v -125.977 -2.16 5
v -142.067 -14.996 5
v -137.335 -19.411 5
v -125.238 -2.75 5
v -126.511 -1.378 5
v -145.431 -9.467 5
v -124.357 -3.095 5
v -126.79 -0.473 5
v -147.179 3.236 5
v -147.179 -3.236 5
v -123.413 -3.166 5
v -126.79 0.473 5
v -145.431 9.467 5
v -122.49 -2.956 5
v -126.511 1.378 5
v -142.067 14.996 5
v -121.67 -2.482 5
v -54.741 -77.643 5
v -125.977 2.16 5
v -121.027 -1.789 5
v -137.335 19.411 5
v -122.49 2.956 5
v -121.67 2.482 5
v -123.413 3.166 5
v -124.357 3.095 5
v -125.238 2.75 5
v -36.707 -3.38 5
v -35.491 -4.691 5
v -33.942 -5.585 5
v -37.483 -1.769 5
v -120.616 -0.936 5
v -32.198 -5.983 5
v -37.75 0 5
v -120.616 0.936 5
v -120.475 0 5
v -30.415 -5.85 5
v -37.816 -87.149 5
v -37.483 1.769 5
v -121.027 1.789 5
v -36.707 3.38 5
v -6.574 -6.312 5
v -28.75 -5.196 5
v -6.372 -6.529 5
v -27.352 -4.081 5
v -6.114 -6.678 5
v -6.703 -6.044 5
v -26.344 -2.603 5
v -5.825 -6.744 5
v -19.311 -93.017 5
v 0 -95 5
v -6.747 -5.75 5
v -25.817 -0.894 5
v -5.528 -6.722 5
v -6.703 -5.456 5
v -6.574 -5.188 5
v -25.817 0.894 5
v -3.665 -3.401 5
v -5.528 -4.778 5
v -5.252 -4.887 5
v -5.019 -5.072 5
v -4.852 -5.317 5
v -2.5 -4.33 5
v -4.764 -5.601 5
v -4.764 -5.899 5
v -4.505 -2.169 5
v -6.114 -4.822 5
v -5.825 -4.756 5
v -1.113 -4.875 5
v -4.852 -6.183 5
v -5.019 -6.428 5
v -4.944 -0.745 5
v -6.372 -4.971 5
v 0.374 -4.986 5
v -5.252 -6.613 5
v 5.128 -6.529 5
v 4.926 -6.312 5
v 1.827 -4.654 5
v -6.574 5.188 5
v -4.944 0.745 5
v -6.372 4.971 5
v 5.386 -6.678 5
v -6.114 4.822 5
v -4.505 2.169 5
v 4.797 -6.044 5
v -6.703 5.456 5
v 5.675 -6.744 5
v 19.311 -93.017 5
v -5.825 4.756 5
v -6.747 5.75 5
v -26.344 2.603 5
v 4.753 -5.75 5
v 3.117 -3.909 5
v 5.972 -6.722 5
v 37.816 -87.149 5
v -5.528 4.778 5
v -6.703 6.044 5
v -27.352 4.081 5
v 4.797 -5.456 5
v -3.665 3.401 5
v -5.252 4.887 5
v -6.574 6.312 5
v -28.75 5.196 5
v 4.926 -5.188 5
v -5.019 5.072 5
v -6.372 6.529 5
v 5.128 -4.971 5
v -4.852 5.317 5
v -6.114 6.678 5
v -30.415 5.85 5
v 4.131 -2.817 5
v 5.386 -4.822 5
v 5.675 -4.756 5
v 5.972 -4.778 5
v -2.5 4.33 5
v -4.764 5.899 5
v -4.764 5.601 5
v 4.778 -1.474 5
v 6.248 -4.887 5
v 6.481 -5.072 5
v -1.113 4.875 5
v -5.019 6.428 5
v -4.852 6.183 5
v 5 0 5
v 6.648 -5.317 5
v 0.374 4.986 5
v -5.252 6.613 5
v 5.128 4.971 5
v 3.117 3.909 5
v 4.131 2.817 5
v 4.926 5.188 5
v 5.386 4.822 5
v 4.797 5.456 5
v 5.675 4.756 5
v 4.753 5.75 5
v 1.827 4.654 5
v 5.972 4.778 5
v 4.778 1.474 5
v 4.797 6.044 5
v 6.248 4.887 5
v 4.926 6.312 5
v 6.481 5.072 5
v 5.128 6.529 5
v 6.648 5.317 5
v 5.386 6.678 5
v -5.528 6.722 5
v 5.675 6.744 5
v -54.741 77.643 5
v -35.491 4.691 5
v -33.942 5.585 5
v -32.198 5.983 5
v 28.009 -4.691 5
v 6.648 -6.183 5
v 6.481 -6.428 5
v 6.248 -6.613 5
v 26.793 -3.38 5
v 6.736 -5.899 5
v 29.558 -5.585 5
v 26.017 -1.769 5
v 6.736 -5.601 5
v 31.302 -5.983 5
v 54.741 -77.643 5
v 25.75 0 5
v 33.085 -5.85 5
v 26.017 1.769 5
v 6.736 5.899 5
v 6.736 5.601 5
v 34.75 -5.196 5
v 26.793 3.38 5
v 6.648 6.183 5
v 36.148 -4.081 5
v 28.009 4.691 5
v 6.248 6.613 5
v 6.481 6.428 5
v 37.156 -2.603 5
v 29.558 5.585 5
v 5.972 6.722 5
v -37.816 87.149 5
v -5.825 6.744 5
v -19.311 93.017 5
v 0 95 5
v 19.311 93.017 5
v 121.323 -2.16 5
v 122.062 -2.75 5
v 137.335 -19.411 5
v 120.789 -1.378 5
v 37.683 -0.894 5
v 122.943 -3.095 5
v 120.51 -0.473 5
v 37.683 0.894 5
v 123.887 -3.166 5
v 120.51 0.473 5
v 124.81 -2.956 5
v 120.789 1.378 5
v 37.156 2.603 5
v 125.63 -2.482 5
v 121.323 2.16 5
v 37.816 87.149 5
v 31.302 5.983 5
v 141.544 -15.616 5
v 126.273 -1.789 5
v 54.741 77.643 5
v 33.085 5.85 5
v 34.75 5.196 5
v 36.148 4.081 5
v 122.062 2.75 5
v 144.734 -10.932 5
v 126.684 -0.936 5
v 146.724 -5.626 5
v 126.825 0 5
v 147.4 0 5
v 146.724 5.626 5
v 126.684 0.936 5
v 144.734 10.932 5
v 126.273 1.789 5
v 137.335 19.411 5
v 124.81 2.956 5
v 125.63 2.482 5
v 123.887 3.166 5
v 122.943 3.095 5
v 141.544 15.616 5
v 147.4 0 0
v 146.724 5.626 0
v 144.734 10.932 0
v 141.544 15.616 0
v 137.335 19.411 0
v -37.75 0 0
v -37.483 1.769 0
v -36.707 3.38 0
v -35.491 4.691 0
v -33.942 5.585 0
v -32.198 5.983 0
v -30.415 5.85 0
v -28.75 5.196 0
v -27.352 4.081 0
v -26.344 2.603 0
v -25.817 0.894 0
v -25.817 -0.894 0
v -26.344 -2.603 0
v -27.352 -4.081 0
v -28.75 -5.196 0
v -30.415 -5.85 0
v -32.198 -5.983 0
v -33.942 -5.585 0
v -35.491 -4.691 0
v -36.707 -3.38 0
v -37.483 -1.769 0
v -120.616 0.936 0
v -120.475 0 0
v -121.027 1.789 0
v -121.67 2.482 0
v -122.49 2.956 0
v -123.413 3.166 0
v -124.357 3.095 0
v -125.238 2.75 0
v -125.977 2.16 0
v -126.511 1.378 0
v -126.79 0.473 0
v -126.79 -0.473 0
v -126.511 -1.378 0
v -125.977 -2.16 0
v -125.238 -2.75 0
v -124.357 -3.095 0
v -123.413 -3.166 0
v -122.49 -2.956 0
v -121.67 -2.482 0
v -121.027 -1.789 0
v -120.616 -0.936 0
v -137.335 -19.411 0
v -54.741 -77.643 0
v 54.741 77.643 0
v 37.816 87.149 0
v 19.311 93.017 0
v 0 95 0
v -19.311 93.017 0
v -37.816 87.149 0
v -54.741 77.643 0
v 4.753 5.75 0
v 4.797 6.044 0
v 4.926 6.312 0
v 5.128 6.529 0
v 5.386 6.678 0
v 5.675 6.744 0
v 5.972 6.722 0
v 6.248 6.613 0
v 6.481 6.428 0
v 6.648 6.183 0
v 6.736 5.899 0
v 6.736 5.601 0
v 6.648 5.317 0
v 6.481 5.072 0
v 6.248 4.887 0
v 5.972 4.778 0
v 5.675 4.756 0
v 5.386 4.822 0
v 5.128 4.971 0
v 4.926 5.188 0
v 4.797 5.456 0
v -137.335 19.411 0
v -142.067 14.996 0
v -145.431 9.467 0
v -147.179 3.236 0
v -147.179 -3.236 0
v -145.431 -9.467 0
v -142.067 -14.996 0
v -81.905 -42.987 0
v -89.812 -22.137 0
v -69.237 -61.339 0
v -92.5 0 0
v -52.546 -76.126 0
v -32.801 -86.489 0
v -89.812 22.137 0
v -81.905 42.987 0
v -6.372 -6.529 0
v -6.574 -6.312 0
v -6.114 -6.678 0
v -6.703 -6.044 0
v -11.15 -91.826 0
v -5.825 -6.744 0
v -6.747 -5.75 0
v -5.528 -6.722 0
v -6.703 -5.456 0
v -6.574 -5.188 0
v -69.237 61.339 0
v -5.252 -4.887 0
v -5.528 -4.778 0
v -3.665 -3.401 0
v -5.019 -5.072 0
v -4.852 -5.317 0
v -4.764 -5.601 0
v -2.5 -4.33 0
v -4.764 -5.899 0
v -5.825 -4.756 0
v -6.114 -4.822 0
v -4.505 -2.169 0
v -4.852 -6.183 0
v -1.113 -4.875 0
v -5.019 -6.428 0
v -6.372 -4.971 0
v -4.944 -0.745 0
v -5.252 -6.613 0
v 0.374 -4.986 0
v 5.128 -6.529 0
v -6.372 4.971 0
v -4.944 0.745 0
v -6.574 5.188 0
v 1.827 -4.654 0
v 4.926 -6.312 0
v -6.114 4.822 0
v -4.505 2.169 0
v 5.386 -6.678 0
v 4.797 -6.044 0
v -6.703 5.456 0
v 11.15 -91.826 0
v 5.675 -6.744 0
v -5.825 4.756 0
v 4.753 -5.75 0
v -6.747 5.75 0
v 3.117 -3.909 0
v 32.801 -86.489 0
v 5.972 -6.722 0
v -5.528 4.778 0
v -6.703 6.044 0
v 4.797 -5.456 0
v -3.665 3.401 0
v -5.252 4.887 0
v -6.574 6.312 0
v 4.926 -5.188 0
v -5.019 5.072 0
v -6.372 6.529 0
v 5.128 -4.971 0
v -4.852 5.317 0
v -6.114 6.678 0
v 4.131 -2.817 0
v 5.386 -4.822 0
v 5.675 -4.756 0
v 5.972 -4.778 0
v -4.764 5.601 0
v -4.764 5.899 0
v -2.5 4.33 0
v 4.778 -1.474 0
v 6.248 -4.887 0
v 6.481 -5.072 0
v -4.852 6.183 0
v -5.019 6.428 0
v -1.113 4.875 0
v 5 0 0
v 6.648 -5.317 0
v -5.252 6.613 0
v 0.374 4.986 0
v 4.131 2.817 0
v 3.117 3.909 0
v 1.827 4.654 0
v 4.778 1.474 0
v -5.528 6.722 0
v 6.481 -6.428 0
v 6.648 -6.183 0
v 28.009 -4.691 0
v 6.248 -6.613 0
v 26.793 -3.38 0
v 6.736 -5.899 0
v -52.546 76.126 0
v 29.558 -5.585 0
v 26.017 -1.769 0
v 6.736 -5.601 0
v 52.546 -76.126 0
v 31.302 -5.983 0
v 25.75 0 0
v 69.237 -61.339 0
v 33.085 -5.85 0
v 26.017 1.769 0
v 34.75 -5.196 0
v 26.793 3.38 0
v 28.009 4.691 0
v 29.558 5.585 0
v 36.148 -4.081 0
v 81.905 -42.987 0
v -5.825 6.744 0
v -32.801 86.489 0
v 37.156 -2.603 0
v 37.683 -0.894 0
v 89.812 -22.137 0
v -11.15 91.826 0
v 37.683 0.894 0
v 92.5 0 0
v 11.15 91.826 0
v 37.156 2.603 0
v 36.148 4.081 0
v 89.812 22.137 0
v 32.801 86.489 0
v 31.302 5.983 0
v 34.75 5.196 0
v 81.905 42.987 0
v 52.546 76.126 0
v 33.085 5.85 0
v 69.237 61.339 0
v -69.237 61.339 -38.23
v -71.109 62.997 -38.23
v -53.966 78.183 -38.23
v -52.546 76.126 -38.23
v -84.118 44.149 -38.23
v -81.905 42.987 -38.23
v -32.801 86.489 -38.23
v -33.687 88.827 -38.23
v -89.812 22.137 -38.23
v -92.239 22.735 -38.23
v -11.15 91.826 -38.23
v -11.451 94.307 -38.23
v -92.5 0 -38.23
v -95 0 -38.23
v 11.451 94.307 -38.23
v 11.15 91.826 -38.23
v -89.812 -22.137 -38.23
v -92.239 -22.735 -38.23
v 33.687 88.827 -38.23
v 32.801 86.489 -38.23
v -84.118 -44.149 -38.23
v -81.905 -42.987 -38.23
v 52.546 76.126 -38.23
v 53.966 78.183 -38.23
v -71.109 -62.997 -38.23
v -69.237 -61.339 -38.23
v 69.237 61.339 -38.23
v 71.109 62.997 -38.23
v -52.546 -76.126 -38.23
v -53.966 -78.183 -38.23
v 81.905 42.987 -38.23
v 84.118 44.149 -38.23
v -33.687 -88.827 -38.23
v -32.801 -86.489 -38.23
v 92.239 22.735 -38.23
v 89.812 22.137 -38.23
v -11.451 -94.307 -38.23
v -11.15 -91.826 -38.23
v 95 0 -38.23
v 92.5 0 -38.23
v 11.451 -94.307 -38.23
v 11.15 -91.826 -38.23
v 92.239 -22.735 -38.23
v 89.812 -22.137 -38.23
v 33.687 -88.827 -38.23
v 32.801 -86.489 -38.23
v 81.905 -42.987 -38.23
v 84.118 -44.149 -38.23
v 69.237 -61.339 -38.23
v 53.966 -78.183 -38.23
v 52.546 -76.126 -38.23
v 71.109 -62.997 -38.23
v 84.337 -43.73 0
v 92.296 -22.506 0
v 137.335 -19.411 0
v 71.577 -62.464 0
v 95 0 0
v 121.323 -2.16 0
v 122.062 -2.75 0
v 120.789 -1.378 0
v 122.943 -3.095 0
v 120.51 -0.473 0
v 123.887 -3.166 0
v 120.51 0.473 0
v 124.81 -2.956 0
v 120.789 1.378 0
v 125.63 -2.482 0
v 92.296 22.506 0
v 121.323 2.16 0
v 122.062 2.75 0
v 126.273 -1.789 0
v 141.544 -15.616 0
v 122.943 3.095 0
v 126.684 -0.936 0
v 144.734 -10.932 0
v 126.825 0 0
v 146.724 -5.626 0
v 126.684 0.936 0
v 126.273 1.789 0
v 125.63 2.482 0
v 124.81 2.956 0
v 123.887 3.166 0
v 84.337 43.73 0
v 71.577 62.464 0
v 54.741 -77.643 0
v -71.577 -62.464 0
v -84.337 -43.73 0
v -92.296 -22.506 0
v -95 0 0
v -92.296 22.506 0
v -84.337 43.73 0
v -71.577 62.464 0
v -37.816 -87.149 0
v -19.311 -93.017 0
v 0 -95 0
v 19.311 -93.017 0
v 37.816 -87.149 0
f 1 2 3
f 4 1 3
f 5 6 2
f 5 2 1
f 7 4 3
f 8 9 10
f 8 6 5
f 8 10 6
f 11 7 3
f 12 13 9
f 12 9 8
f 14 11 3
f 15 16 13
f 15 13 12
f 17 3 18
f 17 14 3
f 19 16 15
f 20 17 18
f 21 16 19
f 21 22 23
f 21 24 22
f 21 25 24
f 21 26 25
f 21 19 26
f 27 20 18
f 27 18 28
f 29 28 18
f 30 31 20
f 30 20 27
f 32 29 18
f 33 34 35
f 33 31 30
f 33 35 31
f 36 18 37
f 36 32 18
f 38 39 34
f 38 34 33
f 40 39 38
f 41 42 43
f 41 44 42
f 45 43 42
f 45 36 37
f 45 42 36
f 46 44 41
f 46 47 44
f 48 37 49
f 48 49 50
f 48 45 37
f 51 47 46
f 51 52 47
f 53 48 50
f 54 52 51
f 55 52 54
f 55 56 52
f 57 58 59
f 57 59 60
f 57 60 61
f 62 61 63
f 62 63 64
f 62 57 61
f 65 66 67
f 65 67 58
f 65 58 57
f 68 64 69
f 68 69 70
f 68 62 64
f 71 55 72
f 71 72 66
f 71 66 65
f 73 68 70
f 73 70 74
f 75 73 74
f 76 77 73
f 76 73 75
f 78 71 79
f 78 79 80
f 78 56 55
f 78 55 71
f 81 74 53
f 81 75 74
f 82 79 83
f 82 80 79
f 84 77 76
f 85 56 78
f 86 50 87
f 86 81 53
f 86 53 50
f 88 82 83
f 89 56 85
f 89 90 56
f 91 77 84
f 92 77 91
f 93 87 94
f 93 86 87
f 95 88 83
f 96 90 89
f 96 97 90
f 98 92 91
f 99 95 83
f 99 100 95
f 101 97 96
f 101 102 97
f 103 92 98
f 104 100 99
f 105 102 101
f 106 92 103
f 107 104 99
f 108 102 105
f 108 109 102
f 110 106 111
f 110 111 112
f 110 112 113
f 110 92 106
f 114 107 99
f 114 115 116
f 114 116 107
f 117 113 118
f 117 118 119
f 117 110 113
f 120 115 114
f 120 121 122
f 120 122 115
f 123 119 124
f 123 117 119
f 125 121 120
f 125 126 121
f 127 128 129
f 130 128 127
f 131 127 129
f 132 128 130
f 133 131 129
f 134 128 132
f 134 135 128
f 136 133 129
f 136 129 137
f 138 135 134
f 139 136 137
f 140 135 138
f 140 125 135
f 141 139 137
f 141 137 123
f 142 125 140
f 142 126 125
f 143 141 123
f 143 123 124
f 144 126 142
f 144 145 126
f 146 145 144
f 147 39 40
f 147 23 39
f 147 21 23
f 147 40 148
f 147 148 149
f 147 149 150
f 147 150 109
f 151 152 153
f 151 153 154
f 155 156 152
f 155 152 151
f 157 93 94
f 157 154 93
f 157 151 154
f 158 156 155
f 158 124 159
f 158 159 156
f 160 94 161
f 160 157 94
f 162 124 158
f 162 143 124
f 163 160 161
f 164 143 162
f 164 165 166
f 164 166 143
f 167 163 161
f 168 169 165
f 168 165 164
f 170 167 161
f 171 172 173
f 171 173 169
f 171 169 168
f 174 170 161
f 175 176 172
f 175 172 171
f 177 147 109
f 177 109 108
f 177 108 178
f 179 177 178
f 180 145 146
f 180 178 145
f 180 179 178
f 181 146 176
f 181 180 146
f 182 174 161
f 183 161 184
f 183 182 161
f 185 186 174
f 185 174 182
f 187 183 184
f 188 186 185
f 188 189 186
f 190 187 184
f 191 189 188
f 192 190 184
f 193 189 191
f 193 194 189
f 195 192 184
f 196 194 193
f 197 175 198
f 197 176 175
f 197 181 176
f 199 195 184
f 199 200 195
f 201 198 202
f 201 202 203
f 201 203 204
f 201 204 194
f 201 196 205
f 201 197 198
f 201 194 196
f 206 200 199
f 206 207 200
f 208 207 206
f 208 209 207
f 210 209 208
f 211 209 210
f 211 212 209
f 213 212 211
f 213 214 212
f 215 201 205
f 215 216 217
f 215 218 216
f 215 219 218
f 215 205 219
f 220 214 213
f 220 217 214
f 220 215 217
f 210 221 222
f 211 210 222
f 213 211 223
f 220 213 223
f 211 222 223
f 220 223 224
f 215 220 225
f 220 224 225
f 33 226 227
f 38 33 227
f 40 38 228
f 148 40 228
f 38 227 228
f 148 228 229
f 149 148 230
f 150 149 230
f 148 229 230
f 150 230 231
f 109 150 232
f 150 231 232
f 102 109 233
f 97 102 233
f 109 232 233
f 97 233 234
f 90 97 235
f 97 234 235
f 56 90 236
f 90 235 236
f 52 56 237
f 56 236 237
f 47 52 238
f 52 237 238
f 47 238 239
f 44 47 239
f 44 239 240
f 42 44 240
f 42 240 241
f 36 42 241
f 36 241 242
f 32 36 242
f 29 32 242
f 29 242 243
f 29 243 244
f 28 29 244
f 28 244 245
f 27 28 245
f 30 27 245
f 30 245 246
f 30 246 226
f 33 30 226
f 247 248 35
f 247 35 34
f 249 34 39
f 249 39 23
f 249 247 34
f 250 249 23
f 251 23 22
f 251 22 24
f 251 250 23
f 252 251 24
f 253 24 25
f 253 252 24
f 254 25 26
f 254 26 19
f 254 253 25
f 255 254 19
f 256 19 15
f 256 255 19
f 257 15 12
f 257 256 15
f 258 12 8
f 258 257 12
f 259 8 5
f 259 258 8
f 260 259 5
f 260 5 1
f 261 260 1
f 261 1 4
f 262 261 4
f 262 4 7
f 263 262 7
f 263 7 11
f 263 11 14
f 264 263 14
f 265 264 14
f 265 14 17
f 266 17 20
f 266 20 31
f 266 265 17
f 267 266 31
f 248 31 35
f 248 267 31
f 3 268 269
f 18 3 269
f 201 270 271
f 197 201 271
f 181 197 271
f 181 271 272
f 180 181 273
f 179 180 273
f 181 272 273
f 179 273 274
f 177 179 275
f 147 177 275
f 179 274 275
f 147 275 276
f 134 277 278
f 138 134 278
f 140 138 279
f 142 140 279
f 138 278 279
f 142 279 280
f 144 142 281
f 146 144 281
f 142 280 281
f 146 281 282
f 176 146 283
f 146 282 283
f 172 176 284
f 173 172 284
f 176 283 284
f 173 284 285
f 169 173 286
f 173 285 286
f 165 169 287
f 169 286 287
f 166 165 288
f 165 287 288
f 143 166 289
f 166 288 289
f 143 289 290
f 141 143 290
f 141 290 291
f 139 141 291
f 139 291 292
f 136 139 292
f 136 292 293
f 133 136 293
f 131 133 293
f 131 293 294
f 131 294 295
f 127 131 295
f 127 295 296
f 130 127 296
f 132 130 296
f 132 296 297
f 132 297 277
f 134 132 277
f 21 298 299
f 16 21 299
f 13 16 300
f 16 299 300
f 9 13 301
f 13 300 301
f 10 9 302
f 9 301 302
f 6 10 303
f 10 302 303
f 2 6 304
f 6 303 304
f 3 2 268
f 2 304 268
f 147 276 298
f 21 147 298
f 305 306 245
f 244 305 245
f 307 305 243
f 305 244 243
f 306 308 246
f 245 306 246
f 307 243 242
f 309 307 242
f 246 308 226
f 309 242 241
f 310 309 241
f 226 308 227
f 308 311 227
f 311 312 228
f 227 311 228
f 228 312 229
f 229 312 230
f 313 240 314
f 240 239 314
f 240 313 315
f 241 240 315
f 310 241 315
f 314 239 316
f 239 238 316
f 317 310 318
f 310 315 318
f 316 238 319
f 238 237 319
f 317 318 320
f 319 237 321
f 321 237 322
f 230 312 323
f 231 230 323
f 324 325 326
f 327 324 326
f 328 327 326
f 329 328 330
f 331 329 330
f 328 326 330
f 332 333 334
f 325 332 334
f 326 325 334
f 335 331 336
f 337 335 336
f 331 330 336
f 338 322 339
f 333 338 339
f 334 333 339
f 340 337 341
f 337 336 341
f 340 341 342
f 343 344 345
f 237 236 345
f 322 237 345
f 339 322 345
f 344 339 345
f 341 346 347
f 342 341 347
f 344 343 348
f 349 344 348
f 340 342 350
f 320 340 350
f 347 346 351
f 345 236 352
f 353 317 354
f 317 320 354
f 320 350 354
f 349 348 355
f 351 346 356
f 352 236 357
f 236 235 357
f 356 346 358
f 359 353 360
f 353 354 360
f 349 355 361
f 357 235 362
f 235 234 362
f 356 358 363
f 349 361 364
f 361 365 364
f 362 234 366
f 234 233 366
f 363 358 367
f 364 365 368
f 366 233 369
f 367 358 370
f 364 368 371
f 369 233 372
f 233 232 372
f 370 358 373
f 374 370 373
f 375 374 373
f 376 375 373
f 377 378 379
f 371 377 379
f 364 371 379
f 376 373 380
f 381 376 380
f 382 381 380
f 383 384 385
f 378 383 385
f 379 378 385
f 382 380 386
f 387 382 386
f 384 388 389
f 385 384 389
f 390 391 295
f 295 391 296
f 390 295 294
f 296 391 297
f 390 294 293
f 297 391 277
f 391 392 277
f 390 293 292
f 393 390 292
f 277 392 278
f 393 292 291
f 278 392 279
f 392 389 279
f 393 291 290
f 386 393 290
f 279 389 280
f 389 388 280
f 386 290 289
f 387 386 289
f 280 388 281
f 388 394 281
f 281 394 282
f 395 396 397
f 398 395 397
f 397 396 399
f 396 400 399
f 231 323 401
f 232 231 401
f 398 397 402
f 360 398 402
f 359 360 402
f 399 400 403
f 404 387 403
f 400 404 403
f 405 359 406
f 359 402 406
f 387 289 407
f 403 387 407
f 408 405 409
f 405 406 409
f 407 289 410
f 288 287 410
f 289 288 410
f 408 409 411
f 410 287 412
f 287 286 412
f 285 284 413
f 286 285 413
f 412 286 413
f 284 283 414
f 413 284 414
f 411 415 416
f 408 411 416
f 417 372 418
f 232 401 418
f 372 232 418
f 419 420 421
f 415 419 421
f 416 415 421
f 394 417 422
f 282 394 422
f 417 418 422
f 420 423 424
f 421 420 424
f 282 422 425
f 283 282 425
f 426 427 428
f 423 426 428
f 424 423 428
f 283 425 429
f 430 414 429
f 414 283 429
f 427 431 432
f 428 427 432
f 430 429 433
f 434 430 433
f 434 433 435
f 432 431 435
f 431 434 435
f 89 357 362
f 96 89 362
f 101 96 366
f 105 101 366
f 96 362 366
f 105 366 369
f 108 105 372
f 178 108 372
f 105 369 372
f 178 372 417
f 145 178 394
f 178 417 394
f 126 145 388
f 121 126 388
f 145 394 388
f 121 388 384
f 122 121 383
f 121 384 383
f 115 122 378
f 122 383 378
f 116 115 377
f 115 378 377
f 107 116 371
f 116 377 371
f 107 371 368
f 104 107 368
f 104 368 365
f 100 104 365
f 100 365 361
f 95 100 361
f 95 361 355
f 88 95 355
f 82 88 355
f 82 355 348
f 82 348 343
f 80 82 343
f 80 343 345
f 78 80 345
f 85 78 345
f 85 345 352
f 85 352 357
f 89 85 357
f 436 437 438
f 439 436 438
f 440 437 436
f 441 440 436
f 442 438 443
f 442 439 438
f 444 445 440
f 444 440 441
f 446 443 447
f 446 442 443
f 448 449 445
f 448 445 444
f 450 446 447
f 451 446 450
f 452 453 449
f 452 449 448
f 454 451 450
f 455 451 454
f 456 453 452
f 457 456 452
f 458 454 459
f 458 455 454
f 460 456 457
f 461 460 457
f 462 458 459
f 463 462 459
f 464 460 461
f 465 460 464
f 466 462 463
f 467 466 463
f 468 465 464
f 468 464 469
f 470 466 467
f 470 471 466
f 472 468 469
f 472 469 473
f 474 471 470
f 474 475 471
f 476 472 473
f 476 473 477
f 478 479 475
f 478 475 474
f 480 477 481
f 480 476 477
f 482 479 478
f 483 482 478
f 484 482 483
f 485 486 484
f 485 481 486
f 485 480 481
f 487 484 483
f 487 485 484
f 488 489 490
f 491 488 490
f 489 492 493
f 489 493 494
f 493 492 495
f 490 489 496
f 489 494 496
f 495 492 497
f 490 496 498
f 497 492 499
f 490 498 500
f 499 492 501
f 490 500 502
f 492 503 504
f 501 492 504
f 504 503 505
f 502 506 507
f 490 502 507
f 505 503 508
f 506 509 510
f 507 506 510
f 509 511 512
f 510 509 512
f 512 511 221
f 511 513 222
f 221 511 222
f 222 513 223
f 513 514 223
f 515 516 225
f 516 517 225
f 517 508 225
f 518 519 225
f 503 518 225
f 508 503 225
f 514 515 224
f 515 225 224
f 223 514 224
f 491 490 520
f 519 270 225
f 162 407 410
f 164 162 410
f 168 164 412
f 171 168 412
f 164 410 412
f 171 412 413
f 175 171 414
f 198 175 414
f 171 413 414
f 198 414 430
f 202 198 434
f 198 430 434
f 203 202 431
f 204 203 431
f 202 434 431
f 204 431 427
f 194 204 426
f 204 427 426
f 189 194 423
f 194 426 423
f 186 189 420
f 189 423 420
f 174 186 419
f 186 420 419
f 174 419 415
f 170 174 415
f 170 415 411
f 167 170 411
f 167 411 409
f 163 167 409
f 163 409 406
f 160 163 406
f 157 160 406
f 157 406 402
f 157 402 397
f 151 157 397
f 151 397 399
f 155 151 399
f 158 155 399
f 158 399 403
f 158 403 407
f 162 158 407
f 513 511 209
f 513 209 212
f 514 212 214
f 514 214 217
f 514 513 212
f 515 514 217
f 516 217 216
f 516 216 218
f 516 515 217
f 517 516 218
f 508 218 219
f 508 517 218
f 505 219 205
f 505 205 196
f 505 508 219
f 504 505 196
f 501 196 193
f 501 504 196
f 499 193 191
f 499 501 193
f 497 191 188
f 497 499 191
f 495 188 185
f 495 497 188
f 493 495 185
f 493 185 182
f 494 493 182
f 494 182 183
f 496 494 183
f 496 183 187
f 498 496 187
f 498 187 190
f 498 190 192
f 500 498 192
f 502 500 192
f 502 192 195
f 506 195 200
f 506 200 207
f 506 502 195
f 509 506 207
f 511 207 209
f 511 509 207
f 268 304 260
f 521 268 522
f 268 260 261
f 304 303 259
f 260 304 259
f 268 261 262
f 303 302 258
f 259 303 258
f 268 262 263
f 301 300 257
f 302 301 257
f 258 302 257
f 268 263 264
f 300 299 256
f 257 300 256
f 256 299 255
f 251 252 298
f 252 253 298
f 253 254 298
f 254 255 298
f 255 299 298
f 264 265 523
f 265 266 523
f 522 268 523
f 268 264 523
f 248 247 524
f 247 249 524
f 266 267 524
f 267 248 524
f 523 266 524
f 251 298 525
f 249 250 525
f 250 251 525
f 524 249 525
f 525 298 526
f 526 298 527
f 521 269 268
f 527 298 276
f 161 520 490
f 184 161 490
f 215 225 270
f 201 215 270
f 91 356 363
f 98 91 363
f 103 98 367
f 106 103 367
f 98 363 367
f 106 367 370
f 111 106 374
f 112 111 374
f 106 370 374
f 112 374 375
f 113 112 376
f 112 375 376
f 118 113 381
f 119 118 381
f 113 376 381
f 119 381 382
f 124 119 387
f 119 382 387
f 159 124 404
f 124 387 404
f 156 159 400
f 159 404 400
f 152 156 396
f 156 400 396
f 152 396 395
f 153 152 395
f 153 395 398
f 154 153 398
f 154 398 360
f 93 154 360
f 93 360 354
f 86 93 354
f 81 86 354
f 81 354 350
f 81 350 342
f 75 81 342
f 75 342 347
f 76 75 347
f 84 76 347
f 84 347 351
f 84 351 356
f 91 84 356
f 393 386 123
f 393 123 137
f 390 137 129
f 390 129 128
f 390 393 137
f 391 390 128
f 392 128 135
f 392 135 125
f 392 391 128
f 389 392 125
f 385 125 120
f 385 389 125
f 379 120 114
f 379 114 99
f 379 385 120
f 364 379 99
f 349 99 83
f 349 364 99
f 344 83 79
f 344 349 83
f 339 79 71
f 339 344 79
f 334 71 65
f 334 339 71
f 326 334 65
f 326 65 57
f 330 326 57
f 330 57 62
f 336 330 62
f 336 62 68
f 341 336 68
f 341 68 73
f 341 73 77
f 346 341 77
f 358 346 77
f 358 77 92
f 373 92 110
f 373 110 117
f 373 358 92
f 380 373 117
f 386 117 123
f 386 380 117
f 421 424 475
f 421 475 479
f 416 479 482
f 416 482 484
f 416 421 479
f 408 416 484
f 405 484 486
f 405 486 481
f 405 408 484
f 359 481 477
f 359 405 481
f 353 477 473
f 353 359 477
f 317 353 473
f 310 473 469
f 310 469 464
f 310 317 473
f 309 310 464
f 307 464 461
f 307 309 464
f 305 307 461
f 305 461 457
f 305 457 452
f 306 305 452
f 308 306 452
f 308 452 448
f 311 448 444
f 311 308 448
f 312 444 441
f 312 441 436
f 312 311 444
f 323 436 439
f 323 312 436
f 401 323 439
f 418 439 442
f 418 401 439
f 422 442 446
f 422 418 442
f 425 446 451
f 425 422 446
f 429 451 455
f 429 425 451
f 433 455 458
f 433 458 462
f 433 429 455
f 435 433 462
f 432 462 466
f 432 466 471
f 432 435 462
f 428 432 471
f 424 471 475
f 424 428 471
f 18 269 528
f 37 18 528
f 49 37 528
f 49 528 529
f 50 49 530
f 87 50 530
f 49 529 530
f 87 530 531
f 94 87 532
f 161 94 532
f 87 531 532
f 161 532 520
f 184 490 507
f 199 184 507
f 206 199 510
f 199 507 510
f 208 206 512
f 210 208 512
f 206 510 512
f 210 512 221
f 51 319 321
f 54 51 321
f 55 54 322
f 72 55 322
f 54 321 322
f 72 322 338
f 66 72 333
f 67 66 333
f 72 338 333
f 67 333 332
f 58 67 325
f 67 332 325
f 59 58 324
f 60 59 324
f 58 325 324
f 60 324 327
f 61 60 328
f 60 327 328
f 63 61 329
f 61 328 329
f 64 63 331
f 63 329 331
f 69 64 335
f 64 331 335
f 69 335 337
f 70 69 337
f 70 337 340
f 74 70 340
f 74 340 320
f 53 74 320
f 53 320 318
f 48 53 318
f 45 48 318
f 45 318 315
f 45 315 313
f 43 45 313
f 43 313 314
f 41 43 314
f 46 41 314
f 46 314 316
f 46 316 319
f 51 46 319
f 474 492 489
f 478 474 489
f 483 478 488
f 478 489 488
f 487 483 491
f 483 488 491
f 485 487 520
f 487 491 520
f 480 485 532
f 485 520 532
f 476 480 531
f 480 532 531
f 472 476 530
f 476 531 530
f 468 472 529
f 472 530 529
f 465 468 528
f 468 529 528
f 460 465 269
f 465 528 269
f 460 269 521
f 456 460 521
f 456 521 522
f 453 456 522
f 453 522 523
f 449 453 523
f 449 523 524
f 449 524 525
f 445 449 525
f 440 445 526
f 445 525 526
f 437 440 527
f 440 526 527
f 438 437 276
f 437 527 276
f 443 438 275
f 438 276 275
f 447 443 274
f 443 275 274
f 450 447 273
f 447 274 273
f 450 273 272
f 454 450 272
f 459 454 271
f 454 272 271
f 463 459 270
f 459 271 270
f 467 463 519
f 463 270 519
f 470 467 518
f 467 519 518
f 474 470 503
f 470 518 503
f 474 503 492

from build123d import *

# Parameters (mm, degrees)
F0_R     = 5
F0_R_2   = 3.175
F1_DEPTH = 5
F2_R     = 95
F2_R_2   = 92.5
F3_DEPTH = 38.23
F6_D     = 1.9939
F6_DEPTH = 13.58625
F6_TIP   = 0.5990279941
F7_D     = 12
F7_DEPTH = 13.59
F7_TIP   = 3.6051637142


with BuildPart() as f1:
    # F0 (on Top) → F1 (new body)
    with BuildSketch(Plane.XY):
        with BuildLine():
            ThreePointArc((54.7412050142, -77.6427747675), (84.3368676094, -43.7297697436), (95, 0))
            ThreePointArc((95, 0), (84.3368676094, 43.7297697436), (54.7412050142, 77.6427747675))
            ThreePointArc((54.7412050142, 77.6427747675), (0, 95), (-54.7412050142, 77.6427747675))
            ThreePointArc((-54.7412050142, 77.6427747675), (-95, 0), (-54.7412050142, -77.6427747675))
            ThreePointArc((-54.7412050142, -77.6427747675), (0, -95), (54.7412050142, -77.6427747675))
        make_face()
        Circle(F0_R, mode=Mode.SUBTRACT)
        with BuildLine():
            ThreePointArc((54.7412050142, 77.6427747675), (84.3368676094, 43.7297697436), (95, 0))
            ThreePointArc((95, 0), (84.3368676094, -43.7297697436), (54.7412050142, -77.6427747675))
            Line((54.7412050142, -77.6427747675), (137.3353012535, -19.4106936919))
            ThreePointArc((137.3353012535, -19.4106936919), (99.9, 0), (137.3353012535, 19.4106936919))
            Line((137.3353012535, 19.4106936919), (54.7412050142, 77.6427747675))
        make_face()
        with BuildLine():
            ThreePointArc((-54.7412050142, -77.6427747675), (-95, 0), (-54.7412050142, 77.6427747675))
            Line((-54.7412050142, 77.6427747675), (-137.3353012535, 19.4106936919))
            ThreePointArc((-137.3353012535, 19.4106936919), (-112.7175575641, 21.0842169024), (-99.9, 0))
            ThreePointArc((-99.9, 0), (-112.7175575641, -21.0842169024), (-137.3353012535, -19.4106936919))
            Line((-137.3353012535, -19.4106936919), (-54.7412050142, -77.6427747675))
        make_face()
        with BuildLine():
            ThreePointArc((147.4, 0), (144.7342169024, 10.9324424359), (137.3353012535, 19.4106936919))
            ThreePointArc((137.3353012535, 19.4106936919), (99.9, 0), (137.3353012535, -19.4106936919))
            ThreePointArc((137.3353012535, -19.4106936919), (144.7342169024, -10.9324424359), (147.4, 0))
        make_face()
        with Locations((123.65, 0)):
            Circle(F0_R_2, mode=Mode.SUBTRACT)
        with BuildLine():
            ThreePointArc((-99.9, 0), (-112.7175575641, 21.0842169024), (-137.3353012535, 19.4106936919))
            ThreePointArc((-137.3353012535, 19.4106936919), (-147.4, 0), (-137.3353012535, -19.4106936919))
            ThreePointArc((-137.3353012535, -19.4106936919), (-112.7175575641, -21.0842169024), (-99.9, 0))
        make_face()
        with Locations((-123.65, 0)):
            Circle(F0_R_2, mode=Mode.SUBTRACT)
    extrude(amount=F1_DEPTH)

    # F2 (on face) → F3 (join)
    with BuildSketch(Plane(origin=(0, 0, 0), x_dir=(1, 0, 0), z_dir=(0, 0, -1))):
        Circle(F2_R)
        Circle(F2_R_2, mode=Mode.SUBTRACT)
    extrude(amount=F3_DEPTH)

    # F6
    with Locations(Plane.XY.offset(5)):
        with Locations((-5.75, 5.75), (5.75, 5.75), (5.75, -5.75), (-5.75, -5.75)):
            Hole(F6_D / 2, depth=F6_DEPTH)
            with Locations((0, 0, -(F6_DEPTH + F6_TIP / 2))):  # 118° drill point
                Cone(0, F6_D / 2, F6_TIP, mode=Mode.SUBTRACT)

    # F7
    with Locations(Plane.XY.offset(5)):
        with Locations((-31.75, 0), (31.75, 0)):
            Hole(F7_D / 2, depth=F7_DEPTH)
            with Locations((0, 0, -(F7_DEPTH + F7_TIP / 2))):  # 118° drill point
                Cone(0, F7_D / 2, F7_TIP, mode=Mode.SUBTRACT)


solid = f1.part
